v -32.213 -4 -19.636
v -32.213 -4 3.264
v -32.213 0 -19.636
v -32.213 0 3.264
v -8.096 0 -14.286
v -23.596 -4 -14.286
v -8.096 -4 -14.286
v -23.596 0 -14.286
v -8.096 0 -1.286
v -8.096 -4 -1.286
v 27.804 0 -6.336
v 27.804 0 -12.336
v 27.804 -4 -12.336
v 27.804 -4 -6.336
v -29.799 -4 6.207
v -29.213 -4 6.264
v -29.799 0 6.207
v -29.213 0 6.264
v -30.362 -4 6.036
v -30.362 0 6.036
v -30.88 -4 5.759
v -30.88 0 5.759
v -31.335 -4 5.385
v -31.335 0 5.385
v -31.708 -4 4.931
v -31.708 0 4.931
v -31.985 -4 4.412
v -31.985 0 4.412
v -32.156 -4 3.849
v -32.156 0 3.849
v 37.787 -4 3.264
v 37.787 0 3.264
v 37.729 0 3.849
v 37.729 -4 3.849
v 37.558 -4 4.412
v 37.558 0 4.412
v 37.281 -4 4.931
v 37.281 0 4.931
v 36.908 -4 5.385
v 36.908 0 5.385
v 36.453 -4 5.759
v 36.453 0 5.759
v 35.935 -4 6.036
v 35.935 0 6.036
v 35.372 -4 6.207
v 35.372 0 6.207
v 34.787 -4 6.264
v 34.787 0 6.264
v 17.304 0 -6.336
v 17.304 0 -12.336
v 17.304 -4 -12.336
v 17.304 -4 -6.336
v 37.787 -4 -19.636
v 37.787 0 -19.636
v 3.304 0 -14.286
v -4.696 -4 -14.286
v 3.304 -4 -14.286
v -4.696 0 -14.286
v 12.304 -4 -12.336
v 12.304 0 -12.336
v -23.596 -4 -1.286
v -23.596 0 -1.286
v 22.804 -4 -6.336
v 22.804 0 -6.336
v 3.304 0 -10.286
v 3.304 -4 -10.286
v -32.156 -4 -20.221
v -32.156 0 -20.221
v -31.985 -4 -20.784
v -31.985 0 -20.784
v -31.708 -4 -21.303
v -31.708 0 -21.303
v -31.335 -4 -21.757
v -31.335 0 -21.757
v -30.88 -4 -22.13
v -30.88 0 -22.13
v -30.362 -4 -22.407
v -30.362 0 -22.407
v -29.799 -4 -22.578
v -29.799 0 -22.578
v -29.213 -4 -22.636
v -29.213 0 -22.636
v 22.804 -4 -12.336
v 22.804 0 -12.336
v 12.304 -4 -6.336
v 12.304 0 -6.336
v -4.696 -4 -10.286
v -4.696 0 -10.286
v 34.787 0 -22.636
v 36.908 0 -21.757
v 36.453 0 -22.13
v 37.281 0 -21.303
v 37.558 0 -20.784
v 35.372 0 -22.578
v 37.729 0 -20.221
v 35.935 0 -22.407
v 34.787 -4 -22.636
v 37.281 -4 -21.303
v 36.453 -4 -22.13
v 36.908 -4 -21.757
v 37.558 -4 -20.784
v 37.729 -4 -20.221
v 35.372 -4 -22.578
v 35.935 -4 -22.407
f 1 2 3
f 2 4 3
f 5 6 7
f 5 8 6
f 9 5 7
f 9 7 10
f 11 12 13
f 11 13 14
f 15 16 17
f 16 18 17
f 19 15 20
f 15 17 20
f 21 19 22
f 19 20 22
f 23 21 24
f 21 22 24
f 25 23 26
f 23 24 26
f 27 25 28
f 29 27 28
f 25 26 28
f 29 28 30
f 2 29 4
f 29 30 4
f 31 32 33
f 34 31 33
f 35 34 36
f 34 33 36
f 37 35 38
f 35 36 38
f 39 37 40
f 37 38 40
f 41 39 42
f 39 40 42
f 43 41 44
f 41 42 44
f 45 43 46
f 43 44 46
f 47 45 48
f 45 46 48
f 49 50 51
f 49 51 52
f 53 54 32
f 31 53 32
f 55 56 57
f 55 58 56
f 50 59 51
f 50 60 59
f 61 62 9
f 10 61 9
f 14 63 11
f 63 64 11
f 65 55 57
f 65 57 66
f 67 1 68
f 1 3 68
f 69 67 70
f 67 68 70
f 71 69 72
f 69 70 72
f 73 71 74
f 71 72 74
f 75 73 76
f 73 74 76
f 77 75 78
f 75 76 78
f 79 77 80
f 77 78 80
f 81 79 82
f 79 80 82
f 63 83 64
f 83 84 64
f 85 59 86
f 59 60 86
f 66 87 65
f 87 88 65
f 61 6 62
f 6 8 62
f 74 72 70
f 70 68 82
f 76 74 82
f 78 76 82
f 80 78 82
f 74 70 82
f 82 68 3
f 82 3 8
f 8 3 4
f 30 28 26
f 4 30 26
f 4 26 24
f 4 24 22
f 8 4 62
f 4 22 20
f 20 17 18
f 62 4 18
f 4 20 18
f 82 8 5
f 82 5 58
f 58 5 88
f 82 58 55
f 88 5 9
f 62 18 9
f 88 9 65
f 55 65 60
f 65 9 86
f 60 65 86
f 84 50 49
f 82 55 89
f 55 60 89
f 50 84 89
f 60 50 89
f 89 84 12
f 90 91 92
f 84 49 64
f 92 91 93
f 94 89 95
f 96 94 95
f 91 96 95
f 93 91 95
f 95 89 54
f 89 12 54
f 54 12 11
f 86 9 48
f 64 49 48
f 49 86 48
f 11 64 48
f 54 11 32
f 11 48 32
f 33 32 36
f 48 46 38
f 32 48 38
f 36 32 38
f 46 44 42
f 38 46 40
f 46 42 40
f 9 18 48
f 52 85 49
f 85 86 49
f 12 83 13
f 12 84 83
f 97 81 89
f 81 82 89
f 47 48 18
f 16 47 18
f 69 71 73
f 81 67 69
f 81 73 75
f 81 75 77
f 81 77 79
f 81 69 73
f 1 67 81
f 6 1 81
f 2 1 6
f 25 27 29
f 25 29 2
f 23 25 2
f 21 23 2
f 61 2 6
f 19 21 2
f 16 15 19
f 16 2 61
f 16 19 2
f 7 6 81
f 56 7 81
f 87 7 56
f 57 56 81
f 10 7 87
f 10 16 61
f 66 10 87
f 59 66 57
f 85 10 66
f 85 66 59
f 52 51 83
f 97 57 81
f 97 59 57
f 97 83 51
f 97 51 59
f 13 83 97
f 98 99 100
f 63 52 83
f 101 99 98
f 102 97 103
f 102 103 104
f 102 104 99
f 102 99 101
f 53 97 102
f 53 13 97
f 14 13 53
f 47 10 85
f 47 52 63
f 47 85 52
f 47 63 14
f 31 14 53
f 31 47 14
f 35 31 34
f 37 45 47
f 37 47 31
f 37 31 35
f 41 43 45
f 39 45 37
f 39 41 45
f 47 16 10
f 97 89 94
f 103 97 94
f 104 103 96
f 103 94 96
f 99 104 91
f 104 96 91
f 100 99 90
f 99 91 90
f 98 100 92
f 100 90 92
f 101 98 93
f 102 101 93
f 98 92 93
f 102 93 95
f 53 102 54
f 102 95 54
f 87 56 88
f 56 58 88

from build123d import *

# Parameters (mm, degrees)
F0_W     = 8
F0_H     = 4
F0_W_2   = 5
F0_H_2   = 6
F0_W_3   = 15.5
F0_H_3   = 13
F1_DEPTH = 1.8
F2_DEPTH = 2
F3_DEPTH = 2


# Not quite as in the source:
# - a feature of the source that left no trace in its solid (it failed there, or was rolled back) is left out


with BuildPart() as f1:
    # F0 (on Front) → F1 (new body)
    with BuildSketch(Plane.XZ):
        with BuildLine():
            Line((34.7865003794, 6.2641621617), (-29.2134996206, 6.2641621617))
            ThreePointArc((-29.2134996206, 6.2641621617), (-31.3348199641, 5.3854825052), (-32.2134996206, 3.2641621617))
            Line((-32.2134996206, 3.2641621617), (-32.2134996206, -19.6358378383))
            ThreePointArc((-32.2134996206, -19.6358378383), (-31.3348199641, -21.7571581819), (-29.2134996206, -22.6358378383))
            Line((-29.2134996206, -22.6358378383), (34.7865003794, -22.6358378383))
            ThreePointArc((34.7865003794, -22.6358378383), (36.907820723, -21.7571581819), (37.7865003794, -19.6358378383))
            Line((37.7865003794, -19.6358378383), (37.7865003794, 3.2641621617))
            ThreePointArc((37.7865003794, 3.2641621617), (36.907820723, 5.3854825052), (34.7865003794, 6.2641621617))
        make_face()
        with Locations((-0.6956385732, -12.2858378383)):
            Rectangle(F0_W, F0_H, mode=Mode.SUBTRACT)
        with Locations((14.8043614268, -9.3358378383)):
            Rectangle(F0_W_2, F0_H_2, mode=Mode.SUBTRACT)
        with Locations((25.3043614268, -9.3358378383)):
            Rectangle(F0_W_2, F0_H_2, mode=Mode.SUBTRACT)
        with Locations((-15.8456385732, -7.7858378383)):
            Rectangle(F0_W_3, F0_H_3, mode=Mode.SUBTRACT)
    extrude(amount=F1_DEPTH)

    # F0 (on Front) → F2 (join)
    with BuildSketch(Plane.XZ):
        with BuildLine():
            Line((34.7865003794, 6.2641621617), (-29.2134996206, 6.2641621617))
            ThreePointArc((-29.2134996206, 6.2641621617), (-31.3348199641, 5.3854825052), (-32.2134996206, 3.2641621617))
            Line((-32.2134996206, 3.2641621617), (-32.2134996206, -19.6358378383))
            ThreePointArc((-32.2134996206, -19.6358378383), (-31.3348199641, -21.7571581819), (-29.2134996206, -22.6358378383))
            Line((-29.2134996206, -22.6358378383), (34.7865003794, -22.6358378383))
            ThreePointArc((34.7865003794, -22.6358378383), (36.907820723, -21.7571581819), (37.7865003794, -19.6358378383))
            Line((37.7865003794, -19.6358378383), (37.7865003794, 3.2641621617))
            ThreePointArc((37.7865003794, 3.2641621617), (36.907820723, 5.3854825052), (34.7865003794, 6.2641621617))
        make_face()
        with Locations((-0.6956385732, -12.2858378383)):
            Rectangle(F0_W, F0_H, mode=Mode.SUBTRACT)
        with Locations((14.8043614268, -9.3358378383)):
            Rectangle(F0_W_2, F0_H_2, mode=Mode.SUBTRACT)
        with Locations((25.3043614268, -9.3358378383)):
            Rectangle(F0_W_2, F0_H_2, mode=Mode.SUBTRACT)
        with Locations((-15.8456385732, -7.7858378383)):
            Rectangle(F0_W_3, F0_H_3, mode=Mode.SUBTRACT)
    extrude(amount=F2_DEPTH)

    # F3 (add): a face of the model
    f3_faces = [f1.faces().sort_by_distance(p)[0] for p in [
        (4.4299984424, -2, -8.1163746121),
    ]]
    extrude(f3_faces, amount=F3_DEPTH)


solid = f1.part
